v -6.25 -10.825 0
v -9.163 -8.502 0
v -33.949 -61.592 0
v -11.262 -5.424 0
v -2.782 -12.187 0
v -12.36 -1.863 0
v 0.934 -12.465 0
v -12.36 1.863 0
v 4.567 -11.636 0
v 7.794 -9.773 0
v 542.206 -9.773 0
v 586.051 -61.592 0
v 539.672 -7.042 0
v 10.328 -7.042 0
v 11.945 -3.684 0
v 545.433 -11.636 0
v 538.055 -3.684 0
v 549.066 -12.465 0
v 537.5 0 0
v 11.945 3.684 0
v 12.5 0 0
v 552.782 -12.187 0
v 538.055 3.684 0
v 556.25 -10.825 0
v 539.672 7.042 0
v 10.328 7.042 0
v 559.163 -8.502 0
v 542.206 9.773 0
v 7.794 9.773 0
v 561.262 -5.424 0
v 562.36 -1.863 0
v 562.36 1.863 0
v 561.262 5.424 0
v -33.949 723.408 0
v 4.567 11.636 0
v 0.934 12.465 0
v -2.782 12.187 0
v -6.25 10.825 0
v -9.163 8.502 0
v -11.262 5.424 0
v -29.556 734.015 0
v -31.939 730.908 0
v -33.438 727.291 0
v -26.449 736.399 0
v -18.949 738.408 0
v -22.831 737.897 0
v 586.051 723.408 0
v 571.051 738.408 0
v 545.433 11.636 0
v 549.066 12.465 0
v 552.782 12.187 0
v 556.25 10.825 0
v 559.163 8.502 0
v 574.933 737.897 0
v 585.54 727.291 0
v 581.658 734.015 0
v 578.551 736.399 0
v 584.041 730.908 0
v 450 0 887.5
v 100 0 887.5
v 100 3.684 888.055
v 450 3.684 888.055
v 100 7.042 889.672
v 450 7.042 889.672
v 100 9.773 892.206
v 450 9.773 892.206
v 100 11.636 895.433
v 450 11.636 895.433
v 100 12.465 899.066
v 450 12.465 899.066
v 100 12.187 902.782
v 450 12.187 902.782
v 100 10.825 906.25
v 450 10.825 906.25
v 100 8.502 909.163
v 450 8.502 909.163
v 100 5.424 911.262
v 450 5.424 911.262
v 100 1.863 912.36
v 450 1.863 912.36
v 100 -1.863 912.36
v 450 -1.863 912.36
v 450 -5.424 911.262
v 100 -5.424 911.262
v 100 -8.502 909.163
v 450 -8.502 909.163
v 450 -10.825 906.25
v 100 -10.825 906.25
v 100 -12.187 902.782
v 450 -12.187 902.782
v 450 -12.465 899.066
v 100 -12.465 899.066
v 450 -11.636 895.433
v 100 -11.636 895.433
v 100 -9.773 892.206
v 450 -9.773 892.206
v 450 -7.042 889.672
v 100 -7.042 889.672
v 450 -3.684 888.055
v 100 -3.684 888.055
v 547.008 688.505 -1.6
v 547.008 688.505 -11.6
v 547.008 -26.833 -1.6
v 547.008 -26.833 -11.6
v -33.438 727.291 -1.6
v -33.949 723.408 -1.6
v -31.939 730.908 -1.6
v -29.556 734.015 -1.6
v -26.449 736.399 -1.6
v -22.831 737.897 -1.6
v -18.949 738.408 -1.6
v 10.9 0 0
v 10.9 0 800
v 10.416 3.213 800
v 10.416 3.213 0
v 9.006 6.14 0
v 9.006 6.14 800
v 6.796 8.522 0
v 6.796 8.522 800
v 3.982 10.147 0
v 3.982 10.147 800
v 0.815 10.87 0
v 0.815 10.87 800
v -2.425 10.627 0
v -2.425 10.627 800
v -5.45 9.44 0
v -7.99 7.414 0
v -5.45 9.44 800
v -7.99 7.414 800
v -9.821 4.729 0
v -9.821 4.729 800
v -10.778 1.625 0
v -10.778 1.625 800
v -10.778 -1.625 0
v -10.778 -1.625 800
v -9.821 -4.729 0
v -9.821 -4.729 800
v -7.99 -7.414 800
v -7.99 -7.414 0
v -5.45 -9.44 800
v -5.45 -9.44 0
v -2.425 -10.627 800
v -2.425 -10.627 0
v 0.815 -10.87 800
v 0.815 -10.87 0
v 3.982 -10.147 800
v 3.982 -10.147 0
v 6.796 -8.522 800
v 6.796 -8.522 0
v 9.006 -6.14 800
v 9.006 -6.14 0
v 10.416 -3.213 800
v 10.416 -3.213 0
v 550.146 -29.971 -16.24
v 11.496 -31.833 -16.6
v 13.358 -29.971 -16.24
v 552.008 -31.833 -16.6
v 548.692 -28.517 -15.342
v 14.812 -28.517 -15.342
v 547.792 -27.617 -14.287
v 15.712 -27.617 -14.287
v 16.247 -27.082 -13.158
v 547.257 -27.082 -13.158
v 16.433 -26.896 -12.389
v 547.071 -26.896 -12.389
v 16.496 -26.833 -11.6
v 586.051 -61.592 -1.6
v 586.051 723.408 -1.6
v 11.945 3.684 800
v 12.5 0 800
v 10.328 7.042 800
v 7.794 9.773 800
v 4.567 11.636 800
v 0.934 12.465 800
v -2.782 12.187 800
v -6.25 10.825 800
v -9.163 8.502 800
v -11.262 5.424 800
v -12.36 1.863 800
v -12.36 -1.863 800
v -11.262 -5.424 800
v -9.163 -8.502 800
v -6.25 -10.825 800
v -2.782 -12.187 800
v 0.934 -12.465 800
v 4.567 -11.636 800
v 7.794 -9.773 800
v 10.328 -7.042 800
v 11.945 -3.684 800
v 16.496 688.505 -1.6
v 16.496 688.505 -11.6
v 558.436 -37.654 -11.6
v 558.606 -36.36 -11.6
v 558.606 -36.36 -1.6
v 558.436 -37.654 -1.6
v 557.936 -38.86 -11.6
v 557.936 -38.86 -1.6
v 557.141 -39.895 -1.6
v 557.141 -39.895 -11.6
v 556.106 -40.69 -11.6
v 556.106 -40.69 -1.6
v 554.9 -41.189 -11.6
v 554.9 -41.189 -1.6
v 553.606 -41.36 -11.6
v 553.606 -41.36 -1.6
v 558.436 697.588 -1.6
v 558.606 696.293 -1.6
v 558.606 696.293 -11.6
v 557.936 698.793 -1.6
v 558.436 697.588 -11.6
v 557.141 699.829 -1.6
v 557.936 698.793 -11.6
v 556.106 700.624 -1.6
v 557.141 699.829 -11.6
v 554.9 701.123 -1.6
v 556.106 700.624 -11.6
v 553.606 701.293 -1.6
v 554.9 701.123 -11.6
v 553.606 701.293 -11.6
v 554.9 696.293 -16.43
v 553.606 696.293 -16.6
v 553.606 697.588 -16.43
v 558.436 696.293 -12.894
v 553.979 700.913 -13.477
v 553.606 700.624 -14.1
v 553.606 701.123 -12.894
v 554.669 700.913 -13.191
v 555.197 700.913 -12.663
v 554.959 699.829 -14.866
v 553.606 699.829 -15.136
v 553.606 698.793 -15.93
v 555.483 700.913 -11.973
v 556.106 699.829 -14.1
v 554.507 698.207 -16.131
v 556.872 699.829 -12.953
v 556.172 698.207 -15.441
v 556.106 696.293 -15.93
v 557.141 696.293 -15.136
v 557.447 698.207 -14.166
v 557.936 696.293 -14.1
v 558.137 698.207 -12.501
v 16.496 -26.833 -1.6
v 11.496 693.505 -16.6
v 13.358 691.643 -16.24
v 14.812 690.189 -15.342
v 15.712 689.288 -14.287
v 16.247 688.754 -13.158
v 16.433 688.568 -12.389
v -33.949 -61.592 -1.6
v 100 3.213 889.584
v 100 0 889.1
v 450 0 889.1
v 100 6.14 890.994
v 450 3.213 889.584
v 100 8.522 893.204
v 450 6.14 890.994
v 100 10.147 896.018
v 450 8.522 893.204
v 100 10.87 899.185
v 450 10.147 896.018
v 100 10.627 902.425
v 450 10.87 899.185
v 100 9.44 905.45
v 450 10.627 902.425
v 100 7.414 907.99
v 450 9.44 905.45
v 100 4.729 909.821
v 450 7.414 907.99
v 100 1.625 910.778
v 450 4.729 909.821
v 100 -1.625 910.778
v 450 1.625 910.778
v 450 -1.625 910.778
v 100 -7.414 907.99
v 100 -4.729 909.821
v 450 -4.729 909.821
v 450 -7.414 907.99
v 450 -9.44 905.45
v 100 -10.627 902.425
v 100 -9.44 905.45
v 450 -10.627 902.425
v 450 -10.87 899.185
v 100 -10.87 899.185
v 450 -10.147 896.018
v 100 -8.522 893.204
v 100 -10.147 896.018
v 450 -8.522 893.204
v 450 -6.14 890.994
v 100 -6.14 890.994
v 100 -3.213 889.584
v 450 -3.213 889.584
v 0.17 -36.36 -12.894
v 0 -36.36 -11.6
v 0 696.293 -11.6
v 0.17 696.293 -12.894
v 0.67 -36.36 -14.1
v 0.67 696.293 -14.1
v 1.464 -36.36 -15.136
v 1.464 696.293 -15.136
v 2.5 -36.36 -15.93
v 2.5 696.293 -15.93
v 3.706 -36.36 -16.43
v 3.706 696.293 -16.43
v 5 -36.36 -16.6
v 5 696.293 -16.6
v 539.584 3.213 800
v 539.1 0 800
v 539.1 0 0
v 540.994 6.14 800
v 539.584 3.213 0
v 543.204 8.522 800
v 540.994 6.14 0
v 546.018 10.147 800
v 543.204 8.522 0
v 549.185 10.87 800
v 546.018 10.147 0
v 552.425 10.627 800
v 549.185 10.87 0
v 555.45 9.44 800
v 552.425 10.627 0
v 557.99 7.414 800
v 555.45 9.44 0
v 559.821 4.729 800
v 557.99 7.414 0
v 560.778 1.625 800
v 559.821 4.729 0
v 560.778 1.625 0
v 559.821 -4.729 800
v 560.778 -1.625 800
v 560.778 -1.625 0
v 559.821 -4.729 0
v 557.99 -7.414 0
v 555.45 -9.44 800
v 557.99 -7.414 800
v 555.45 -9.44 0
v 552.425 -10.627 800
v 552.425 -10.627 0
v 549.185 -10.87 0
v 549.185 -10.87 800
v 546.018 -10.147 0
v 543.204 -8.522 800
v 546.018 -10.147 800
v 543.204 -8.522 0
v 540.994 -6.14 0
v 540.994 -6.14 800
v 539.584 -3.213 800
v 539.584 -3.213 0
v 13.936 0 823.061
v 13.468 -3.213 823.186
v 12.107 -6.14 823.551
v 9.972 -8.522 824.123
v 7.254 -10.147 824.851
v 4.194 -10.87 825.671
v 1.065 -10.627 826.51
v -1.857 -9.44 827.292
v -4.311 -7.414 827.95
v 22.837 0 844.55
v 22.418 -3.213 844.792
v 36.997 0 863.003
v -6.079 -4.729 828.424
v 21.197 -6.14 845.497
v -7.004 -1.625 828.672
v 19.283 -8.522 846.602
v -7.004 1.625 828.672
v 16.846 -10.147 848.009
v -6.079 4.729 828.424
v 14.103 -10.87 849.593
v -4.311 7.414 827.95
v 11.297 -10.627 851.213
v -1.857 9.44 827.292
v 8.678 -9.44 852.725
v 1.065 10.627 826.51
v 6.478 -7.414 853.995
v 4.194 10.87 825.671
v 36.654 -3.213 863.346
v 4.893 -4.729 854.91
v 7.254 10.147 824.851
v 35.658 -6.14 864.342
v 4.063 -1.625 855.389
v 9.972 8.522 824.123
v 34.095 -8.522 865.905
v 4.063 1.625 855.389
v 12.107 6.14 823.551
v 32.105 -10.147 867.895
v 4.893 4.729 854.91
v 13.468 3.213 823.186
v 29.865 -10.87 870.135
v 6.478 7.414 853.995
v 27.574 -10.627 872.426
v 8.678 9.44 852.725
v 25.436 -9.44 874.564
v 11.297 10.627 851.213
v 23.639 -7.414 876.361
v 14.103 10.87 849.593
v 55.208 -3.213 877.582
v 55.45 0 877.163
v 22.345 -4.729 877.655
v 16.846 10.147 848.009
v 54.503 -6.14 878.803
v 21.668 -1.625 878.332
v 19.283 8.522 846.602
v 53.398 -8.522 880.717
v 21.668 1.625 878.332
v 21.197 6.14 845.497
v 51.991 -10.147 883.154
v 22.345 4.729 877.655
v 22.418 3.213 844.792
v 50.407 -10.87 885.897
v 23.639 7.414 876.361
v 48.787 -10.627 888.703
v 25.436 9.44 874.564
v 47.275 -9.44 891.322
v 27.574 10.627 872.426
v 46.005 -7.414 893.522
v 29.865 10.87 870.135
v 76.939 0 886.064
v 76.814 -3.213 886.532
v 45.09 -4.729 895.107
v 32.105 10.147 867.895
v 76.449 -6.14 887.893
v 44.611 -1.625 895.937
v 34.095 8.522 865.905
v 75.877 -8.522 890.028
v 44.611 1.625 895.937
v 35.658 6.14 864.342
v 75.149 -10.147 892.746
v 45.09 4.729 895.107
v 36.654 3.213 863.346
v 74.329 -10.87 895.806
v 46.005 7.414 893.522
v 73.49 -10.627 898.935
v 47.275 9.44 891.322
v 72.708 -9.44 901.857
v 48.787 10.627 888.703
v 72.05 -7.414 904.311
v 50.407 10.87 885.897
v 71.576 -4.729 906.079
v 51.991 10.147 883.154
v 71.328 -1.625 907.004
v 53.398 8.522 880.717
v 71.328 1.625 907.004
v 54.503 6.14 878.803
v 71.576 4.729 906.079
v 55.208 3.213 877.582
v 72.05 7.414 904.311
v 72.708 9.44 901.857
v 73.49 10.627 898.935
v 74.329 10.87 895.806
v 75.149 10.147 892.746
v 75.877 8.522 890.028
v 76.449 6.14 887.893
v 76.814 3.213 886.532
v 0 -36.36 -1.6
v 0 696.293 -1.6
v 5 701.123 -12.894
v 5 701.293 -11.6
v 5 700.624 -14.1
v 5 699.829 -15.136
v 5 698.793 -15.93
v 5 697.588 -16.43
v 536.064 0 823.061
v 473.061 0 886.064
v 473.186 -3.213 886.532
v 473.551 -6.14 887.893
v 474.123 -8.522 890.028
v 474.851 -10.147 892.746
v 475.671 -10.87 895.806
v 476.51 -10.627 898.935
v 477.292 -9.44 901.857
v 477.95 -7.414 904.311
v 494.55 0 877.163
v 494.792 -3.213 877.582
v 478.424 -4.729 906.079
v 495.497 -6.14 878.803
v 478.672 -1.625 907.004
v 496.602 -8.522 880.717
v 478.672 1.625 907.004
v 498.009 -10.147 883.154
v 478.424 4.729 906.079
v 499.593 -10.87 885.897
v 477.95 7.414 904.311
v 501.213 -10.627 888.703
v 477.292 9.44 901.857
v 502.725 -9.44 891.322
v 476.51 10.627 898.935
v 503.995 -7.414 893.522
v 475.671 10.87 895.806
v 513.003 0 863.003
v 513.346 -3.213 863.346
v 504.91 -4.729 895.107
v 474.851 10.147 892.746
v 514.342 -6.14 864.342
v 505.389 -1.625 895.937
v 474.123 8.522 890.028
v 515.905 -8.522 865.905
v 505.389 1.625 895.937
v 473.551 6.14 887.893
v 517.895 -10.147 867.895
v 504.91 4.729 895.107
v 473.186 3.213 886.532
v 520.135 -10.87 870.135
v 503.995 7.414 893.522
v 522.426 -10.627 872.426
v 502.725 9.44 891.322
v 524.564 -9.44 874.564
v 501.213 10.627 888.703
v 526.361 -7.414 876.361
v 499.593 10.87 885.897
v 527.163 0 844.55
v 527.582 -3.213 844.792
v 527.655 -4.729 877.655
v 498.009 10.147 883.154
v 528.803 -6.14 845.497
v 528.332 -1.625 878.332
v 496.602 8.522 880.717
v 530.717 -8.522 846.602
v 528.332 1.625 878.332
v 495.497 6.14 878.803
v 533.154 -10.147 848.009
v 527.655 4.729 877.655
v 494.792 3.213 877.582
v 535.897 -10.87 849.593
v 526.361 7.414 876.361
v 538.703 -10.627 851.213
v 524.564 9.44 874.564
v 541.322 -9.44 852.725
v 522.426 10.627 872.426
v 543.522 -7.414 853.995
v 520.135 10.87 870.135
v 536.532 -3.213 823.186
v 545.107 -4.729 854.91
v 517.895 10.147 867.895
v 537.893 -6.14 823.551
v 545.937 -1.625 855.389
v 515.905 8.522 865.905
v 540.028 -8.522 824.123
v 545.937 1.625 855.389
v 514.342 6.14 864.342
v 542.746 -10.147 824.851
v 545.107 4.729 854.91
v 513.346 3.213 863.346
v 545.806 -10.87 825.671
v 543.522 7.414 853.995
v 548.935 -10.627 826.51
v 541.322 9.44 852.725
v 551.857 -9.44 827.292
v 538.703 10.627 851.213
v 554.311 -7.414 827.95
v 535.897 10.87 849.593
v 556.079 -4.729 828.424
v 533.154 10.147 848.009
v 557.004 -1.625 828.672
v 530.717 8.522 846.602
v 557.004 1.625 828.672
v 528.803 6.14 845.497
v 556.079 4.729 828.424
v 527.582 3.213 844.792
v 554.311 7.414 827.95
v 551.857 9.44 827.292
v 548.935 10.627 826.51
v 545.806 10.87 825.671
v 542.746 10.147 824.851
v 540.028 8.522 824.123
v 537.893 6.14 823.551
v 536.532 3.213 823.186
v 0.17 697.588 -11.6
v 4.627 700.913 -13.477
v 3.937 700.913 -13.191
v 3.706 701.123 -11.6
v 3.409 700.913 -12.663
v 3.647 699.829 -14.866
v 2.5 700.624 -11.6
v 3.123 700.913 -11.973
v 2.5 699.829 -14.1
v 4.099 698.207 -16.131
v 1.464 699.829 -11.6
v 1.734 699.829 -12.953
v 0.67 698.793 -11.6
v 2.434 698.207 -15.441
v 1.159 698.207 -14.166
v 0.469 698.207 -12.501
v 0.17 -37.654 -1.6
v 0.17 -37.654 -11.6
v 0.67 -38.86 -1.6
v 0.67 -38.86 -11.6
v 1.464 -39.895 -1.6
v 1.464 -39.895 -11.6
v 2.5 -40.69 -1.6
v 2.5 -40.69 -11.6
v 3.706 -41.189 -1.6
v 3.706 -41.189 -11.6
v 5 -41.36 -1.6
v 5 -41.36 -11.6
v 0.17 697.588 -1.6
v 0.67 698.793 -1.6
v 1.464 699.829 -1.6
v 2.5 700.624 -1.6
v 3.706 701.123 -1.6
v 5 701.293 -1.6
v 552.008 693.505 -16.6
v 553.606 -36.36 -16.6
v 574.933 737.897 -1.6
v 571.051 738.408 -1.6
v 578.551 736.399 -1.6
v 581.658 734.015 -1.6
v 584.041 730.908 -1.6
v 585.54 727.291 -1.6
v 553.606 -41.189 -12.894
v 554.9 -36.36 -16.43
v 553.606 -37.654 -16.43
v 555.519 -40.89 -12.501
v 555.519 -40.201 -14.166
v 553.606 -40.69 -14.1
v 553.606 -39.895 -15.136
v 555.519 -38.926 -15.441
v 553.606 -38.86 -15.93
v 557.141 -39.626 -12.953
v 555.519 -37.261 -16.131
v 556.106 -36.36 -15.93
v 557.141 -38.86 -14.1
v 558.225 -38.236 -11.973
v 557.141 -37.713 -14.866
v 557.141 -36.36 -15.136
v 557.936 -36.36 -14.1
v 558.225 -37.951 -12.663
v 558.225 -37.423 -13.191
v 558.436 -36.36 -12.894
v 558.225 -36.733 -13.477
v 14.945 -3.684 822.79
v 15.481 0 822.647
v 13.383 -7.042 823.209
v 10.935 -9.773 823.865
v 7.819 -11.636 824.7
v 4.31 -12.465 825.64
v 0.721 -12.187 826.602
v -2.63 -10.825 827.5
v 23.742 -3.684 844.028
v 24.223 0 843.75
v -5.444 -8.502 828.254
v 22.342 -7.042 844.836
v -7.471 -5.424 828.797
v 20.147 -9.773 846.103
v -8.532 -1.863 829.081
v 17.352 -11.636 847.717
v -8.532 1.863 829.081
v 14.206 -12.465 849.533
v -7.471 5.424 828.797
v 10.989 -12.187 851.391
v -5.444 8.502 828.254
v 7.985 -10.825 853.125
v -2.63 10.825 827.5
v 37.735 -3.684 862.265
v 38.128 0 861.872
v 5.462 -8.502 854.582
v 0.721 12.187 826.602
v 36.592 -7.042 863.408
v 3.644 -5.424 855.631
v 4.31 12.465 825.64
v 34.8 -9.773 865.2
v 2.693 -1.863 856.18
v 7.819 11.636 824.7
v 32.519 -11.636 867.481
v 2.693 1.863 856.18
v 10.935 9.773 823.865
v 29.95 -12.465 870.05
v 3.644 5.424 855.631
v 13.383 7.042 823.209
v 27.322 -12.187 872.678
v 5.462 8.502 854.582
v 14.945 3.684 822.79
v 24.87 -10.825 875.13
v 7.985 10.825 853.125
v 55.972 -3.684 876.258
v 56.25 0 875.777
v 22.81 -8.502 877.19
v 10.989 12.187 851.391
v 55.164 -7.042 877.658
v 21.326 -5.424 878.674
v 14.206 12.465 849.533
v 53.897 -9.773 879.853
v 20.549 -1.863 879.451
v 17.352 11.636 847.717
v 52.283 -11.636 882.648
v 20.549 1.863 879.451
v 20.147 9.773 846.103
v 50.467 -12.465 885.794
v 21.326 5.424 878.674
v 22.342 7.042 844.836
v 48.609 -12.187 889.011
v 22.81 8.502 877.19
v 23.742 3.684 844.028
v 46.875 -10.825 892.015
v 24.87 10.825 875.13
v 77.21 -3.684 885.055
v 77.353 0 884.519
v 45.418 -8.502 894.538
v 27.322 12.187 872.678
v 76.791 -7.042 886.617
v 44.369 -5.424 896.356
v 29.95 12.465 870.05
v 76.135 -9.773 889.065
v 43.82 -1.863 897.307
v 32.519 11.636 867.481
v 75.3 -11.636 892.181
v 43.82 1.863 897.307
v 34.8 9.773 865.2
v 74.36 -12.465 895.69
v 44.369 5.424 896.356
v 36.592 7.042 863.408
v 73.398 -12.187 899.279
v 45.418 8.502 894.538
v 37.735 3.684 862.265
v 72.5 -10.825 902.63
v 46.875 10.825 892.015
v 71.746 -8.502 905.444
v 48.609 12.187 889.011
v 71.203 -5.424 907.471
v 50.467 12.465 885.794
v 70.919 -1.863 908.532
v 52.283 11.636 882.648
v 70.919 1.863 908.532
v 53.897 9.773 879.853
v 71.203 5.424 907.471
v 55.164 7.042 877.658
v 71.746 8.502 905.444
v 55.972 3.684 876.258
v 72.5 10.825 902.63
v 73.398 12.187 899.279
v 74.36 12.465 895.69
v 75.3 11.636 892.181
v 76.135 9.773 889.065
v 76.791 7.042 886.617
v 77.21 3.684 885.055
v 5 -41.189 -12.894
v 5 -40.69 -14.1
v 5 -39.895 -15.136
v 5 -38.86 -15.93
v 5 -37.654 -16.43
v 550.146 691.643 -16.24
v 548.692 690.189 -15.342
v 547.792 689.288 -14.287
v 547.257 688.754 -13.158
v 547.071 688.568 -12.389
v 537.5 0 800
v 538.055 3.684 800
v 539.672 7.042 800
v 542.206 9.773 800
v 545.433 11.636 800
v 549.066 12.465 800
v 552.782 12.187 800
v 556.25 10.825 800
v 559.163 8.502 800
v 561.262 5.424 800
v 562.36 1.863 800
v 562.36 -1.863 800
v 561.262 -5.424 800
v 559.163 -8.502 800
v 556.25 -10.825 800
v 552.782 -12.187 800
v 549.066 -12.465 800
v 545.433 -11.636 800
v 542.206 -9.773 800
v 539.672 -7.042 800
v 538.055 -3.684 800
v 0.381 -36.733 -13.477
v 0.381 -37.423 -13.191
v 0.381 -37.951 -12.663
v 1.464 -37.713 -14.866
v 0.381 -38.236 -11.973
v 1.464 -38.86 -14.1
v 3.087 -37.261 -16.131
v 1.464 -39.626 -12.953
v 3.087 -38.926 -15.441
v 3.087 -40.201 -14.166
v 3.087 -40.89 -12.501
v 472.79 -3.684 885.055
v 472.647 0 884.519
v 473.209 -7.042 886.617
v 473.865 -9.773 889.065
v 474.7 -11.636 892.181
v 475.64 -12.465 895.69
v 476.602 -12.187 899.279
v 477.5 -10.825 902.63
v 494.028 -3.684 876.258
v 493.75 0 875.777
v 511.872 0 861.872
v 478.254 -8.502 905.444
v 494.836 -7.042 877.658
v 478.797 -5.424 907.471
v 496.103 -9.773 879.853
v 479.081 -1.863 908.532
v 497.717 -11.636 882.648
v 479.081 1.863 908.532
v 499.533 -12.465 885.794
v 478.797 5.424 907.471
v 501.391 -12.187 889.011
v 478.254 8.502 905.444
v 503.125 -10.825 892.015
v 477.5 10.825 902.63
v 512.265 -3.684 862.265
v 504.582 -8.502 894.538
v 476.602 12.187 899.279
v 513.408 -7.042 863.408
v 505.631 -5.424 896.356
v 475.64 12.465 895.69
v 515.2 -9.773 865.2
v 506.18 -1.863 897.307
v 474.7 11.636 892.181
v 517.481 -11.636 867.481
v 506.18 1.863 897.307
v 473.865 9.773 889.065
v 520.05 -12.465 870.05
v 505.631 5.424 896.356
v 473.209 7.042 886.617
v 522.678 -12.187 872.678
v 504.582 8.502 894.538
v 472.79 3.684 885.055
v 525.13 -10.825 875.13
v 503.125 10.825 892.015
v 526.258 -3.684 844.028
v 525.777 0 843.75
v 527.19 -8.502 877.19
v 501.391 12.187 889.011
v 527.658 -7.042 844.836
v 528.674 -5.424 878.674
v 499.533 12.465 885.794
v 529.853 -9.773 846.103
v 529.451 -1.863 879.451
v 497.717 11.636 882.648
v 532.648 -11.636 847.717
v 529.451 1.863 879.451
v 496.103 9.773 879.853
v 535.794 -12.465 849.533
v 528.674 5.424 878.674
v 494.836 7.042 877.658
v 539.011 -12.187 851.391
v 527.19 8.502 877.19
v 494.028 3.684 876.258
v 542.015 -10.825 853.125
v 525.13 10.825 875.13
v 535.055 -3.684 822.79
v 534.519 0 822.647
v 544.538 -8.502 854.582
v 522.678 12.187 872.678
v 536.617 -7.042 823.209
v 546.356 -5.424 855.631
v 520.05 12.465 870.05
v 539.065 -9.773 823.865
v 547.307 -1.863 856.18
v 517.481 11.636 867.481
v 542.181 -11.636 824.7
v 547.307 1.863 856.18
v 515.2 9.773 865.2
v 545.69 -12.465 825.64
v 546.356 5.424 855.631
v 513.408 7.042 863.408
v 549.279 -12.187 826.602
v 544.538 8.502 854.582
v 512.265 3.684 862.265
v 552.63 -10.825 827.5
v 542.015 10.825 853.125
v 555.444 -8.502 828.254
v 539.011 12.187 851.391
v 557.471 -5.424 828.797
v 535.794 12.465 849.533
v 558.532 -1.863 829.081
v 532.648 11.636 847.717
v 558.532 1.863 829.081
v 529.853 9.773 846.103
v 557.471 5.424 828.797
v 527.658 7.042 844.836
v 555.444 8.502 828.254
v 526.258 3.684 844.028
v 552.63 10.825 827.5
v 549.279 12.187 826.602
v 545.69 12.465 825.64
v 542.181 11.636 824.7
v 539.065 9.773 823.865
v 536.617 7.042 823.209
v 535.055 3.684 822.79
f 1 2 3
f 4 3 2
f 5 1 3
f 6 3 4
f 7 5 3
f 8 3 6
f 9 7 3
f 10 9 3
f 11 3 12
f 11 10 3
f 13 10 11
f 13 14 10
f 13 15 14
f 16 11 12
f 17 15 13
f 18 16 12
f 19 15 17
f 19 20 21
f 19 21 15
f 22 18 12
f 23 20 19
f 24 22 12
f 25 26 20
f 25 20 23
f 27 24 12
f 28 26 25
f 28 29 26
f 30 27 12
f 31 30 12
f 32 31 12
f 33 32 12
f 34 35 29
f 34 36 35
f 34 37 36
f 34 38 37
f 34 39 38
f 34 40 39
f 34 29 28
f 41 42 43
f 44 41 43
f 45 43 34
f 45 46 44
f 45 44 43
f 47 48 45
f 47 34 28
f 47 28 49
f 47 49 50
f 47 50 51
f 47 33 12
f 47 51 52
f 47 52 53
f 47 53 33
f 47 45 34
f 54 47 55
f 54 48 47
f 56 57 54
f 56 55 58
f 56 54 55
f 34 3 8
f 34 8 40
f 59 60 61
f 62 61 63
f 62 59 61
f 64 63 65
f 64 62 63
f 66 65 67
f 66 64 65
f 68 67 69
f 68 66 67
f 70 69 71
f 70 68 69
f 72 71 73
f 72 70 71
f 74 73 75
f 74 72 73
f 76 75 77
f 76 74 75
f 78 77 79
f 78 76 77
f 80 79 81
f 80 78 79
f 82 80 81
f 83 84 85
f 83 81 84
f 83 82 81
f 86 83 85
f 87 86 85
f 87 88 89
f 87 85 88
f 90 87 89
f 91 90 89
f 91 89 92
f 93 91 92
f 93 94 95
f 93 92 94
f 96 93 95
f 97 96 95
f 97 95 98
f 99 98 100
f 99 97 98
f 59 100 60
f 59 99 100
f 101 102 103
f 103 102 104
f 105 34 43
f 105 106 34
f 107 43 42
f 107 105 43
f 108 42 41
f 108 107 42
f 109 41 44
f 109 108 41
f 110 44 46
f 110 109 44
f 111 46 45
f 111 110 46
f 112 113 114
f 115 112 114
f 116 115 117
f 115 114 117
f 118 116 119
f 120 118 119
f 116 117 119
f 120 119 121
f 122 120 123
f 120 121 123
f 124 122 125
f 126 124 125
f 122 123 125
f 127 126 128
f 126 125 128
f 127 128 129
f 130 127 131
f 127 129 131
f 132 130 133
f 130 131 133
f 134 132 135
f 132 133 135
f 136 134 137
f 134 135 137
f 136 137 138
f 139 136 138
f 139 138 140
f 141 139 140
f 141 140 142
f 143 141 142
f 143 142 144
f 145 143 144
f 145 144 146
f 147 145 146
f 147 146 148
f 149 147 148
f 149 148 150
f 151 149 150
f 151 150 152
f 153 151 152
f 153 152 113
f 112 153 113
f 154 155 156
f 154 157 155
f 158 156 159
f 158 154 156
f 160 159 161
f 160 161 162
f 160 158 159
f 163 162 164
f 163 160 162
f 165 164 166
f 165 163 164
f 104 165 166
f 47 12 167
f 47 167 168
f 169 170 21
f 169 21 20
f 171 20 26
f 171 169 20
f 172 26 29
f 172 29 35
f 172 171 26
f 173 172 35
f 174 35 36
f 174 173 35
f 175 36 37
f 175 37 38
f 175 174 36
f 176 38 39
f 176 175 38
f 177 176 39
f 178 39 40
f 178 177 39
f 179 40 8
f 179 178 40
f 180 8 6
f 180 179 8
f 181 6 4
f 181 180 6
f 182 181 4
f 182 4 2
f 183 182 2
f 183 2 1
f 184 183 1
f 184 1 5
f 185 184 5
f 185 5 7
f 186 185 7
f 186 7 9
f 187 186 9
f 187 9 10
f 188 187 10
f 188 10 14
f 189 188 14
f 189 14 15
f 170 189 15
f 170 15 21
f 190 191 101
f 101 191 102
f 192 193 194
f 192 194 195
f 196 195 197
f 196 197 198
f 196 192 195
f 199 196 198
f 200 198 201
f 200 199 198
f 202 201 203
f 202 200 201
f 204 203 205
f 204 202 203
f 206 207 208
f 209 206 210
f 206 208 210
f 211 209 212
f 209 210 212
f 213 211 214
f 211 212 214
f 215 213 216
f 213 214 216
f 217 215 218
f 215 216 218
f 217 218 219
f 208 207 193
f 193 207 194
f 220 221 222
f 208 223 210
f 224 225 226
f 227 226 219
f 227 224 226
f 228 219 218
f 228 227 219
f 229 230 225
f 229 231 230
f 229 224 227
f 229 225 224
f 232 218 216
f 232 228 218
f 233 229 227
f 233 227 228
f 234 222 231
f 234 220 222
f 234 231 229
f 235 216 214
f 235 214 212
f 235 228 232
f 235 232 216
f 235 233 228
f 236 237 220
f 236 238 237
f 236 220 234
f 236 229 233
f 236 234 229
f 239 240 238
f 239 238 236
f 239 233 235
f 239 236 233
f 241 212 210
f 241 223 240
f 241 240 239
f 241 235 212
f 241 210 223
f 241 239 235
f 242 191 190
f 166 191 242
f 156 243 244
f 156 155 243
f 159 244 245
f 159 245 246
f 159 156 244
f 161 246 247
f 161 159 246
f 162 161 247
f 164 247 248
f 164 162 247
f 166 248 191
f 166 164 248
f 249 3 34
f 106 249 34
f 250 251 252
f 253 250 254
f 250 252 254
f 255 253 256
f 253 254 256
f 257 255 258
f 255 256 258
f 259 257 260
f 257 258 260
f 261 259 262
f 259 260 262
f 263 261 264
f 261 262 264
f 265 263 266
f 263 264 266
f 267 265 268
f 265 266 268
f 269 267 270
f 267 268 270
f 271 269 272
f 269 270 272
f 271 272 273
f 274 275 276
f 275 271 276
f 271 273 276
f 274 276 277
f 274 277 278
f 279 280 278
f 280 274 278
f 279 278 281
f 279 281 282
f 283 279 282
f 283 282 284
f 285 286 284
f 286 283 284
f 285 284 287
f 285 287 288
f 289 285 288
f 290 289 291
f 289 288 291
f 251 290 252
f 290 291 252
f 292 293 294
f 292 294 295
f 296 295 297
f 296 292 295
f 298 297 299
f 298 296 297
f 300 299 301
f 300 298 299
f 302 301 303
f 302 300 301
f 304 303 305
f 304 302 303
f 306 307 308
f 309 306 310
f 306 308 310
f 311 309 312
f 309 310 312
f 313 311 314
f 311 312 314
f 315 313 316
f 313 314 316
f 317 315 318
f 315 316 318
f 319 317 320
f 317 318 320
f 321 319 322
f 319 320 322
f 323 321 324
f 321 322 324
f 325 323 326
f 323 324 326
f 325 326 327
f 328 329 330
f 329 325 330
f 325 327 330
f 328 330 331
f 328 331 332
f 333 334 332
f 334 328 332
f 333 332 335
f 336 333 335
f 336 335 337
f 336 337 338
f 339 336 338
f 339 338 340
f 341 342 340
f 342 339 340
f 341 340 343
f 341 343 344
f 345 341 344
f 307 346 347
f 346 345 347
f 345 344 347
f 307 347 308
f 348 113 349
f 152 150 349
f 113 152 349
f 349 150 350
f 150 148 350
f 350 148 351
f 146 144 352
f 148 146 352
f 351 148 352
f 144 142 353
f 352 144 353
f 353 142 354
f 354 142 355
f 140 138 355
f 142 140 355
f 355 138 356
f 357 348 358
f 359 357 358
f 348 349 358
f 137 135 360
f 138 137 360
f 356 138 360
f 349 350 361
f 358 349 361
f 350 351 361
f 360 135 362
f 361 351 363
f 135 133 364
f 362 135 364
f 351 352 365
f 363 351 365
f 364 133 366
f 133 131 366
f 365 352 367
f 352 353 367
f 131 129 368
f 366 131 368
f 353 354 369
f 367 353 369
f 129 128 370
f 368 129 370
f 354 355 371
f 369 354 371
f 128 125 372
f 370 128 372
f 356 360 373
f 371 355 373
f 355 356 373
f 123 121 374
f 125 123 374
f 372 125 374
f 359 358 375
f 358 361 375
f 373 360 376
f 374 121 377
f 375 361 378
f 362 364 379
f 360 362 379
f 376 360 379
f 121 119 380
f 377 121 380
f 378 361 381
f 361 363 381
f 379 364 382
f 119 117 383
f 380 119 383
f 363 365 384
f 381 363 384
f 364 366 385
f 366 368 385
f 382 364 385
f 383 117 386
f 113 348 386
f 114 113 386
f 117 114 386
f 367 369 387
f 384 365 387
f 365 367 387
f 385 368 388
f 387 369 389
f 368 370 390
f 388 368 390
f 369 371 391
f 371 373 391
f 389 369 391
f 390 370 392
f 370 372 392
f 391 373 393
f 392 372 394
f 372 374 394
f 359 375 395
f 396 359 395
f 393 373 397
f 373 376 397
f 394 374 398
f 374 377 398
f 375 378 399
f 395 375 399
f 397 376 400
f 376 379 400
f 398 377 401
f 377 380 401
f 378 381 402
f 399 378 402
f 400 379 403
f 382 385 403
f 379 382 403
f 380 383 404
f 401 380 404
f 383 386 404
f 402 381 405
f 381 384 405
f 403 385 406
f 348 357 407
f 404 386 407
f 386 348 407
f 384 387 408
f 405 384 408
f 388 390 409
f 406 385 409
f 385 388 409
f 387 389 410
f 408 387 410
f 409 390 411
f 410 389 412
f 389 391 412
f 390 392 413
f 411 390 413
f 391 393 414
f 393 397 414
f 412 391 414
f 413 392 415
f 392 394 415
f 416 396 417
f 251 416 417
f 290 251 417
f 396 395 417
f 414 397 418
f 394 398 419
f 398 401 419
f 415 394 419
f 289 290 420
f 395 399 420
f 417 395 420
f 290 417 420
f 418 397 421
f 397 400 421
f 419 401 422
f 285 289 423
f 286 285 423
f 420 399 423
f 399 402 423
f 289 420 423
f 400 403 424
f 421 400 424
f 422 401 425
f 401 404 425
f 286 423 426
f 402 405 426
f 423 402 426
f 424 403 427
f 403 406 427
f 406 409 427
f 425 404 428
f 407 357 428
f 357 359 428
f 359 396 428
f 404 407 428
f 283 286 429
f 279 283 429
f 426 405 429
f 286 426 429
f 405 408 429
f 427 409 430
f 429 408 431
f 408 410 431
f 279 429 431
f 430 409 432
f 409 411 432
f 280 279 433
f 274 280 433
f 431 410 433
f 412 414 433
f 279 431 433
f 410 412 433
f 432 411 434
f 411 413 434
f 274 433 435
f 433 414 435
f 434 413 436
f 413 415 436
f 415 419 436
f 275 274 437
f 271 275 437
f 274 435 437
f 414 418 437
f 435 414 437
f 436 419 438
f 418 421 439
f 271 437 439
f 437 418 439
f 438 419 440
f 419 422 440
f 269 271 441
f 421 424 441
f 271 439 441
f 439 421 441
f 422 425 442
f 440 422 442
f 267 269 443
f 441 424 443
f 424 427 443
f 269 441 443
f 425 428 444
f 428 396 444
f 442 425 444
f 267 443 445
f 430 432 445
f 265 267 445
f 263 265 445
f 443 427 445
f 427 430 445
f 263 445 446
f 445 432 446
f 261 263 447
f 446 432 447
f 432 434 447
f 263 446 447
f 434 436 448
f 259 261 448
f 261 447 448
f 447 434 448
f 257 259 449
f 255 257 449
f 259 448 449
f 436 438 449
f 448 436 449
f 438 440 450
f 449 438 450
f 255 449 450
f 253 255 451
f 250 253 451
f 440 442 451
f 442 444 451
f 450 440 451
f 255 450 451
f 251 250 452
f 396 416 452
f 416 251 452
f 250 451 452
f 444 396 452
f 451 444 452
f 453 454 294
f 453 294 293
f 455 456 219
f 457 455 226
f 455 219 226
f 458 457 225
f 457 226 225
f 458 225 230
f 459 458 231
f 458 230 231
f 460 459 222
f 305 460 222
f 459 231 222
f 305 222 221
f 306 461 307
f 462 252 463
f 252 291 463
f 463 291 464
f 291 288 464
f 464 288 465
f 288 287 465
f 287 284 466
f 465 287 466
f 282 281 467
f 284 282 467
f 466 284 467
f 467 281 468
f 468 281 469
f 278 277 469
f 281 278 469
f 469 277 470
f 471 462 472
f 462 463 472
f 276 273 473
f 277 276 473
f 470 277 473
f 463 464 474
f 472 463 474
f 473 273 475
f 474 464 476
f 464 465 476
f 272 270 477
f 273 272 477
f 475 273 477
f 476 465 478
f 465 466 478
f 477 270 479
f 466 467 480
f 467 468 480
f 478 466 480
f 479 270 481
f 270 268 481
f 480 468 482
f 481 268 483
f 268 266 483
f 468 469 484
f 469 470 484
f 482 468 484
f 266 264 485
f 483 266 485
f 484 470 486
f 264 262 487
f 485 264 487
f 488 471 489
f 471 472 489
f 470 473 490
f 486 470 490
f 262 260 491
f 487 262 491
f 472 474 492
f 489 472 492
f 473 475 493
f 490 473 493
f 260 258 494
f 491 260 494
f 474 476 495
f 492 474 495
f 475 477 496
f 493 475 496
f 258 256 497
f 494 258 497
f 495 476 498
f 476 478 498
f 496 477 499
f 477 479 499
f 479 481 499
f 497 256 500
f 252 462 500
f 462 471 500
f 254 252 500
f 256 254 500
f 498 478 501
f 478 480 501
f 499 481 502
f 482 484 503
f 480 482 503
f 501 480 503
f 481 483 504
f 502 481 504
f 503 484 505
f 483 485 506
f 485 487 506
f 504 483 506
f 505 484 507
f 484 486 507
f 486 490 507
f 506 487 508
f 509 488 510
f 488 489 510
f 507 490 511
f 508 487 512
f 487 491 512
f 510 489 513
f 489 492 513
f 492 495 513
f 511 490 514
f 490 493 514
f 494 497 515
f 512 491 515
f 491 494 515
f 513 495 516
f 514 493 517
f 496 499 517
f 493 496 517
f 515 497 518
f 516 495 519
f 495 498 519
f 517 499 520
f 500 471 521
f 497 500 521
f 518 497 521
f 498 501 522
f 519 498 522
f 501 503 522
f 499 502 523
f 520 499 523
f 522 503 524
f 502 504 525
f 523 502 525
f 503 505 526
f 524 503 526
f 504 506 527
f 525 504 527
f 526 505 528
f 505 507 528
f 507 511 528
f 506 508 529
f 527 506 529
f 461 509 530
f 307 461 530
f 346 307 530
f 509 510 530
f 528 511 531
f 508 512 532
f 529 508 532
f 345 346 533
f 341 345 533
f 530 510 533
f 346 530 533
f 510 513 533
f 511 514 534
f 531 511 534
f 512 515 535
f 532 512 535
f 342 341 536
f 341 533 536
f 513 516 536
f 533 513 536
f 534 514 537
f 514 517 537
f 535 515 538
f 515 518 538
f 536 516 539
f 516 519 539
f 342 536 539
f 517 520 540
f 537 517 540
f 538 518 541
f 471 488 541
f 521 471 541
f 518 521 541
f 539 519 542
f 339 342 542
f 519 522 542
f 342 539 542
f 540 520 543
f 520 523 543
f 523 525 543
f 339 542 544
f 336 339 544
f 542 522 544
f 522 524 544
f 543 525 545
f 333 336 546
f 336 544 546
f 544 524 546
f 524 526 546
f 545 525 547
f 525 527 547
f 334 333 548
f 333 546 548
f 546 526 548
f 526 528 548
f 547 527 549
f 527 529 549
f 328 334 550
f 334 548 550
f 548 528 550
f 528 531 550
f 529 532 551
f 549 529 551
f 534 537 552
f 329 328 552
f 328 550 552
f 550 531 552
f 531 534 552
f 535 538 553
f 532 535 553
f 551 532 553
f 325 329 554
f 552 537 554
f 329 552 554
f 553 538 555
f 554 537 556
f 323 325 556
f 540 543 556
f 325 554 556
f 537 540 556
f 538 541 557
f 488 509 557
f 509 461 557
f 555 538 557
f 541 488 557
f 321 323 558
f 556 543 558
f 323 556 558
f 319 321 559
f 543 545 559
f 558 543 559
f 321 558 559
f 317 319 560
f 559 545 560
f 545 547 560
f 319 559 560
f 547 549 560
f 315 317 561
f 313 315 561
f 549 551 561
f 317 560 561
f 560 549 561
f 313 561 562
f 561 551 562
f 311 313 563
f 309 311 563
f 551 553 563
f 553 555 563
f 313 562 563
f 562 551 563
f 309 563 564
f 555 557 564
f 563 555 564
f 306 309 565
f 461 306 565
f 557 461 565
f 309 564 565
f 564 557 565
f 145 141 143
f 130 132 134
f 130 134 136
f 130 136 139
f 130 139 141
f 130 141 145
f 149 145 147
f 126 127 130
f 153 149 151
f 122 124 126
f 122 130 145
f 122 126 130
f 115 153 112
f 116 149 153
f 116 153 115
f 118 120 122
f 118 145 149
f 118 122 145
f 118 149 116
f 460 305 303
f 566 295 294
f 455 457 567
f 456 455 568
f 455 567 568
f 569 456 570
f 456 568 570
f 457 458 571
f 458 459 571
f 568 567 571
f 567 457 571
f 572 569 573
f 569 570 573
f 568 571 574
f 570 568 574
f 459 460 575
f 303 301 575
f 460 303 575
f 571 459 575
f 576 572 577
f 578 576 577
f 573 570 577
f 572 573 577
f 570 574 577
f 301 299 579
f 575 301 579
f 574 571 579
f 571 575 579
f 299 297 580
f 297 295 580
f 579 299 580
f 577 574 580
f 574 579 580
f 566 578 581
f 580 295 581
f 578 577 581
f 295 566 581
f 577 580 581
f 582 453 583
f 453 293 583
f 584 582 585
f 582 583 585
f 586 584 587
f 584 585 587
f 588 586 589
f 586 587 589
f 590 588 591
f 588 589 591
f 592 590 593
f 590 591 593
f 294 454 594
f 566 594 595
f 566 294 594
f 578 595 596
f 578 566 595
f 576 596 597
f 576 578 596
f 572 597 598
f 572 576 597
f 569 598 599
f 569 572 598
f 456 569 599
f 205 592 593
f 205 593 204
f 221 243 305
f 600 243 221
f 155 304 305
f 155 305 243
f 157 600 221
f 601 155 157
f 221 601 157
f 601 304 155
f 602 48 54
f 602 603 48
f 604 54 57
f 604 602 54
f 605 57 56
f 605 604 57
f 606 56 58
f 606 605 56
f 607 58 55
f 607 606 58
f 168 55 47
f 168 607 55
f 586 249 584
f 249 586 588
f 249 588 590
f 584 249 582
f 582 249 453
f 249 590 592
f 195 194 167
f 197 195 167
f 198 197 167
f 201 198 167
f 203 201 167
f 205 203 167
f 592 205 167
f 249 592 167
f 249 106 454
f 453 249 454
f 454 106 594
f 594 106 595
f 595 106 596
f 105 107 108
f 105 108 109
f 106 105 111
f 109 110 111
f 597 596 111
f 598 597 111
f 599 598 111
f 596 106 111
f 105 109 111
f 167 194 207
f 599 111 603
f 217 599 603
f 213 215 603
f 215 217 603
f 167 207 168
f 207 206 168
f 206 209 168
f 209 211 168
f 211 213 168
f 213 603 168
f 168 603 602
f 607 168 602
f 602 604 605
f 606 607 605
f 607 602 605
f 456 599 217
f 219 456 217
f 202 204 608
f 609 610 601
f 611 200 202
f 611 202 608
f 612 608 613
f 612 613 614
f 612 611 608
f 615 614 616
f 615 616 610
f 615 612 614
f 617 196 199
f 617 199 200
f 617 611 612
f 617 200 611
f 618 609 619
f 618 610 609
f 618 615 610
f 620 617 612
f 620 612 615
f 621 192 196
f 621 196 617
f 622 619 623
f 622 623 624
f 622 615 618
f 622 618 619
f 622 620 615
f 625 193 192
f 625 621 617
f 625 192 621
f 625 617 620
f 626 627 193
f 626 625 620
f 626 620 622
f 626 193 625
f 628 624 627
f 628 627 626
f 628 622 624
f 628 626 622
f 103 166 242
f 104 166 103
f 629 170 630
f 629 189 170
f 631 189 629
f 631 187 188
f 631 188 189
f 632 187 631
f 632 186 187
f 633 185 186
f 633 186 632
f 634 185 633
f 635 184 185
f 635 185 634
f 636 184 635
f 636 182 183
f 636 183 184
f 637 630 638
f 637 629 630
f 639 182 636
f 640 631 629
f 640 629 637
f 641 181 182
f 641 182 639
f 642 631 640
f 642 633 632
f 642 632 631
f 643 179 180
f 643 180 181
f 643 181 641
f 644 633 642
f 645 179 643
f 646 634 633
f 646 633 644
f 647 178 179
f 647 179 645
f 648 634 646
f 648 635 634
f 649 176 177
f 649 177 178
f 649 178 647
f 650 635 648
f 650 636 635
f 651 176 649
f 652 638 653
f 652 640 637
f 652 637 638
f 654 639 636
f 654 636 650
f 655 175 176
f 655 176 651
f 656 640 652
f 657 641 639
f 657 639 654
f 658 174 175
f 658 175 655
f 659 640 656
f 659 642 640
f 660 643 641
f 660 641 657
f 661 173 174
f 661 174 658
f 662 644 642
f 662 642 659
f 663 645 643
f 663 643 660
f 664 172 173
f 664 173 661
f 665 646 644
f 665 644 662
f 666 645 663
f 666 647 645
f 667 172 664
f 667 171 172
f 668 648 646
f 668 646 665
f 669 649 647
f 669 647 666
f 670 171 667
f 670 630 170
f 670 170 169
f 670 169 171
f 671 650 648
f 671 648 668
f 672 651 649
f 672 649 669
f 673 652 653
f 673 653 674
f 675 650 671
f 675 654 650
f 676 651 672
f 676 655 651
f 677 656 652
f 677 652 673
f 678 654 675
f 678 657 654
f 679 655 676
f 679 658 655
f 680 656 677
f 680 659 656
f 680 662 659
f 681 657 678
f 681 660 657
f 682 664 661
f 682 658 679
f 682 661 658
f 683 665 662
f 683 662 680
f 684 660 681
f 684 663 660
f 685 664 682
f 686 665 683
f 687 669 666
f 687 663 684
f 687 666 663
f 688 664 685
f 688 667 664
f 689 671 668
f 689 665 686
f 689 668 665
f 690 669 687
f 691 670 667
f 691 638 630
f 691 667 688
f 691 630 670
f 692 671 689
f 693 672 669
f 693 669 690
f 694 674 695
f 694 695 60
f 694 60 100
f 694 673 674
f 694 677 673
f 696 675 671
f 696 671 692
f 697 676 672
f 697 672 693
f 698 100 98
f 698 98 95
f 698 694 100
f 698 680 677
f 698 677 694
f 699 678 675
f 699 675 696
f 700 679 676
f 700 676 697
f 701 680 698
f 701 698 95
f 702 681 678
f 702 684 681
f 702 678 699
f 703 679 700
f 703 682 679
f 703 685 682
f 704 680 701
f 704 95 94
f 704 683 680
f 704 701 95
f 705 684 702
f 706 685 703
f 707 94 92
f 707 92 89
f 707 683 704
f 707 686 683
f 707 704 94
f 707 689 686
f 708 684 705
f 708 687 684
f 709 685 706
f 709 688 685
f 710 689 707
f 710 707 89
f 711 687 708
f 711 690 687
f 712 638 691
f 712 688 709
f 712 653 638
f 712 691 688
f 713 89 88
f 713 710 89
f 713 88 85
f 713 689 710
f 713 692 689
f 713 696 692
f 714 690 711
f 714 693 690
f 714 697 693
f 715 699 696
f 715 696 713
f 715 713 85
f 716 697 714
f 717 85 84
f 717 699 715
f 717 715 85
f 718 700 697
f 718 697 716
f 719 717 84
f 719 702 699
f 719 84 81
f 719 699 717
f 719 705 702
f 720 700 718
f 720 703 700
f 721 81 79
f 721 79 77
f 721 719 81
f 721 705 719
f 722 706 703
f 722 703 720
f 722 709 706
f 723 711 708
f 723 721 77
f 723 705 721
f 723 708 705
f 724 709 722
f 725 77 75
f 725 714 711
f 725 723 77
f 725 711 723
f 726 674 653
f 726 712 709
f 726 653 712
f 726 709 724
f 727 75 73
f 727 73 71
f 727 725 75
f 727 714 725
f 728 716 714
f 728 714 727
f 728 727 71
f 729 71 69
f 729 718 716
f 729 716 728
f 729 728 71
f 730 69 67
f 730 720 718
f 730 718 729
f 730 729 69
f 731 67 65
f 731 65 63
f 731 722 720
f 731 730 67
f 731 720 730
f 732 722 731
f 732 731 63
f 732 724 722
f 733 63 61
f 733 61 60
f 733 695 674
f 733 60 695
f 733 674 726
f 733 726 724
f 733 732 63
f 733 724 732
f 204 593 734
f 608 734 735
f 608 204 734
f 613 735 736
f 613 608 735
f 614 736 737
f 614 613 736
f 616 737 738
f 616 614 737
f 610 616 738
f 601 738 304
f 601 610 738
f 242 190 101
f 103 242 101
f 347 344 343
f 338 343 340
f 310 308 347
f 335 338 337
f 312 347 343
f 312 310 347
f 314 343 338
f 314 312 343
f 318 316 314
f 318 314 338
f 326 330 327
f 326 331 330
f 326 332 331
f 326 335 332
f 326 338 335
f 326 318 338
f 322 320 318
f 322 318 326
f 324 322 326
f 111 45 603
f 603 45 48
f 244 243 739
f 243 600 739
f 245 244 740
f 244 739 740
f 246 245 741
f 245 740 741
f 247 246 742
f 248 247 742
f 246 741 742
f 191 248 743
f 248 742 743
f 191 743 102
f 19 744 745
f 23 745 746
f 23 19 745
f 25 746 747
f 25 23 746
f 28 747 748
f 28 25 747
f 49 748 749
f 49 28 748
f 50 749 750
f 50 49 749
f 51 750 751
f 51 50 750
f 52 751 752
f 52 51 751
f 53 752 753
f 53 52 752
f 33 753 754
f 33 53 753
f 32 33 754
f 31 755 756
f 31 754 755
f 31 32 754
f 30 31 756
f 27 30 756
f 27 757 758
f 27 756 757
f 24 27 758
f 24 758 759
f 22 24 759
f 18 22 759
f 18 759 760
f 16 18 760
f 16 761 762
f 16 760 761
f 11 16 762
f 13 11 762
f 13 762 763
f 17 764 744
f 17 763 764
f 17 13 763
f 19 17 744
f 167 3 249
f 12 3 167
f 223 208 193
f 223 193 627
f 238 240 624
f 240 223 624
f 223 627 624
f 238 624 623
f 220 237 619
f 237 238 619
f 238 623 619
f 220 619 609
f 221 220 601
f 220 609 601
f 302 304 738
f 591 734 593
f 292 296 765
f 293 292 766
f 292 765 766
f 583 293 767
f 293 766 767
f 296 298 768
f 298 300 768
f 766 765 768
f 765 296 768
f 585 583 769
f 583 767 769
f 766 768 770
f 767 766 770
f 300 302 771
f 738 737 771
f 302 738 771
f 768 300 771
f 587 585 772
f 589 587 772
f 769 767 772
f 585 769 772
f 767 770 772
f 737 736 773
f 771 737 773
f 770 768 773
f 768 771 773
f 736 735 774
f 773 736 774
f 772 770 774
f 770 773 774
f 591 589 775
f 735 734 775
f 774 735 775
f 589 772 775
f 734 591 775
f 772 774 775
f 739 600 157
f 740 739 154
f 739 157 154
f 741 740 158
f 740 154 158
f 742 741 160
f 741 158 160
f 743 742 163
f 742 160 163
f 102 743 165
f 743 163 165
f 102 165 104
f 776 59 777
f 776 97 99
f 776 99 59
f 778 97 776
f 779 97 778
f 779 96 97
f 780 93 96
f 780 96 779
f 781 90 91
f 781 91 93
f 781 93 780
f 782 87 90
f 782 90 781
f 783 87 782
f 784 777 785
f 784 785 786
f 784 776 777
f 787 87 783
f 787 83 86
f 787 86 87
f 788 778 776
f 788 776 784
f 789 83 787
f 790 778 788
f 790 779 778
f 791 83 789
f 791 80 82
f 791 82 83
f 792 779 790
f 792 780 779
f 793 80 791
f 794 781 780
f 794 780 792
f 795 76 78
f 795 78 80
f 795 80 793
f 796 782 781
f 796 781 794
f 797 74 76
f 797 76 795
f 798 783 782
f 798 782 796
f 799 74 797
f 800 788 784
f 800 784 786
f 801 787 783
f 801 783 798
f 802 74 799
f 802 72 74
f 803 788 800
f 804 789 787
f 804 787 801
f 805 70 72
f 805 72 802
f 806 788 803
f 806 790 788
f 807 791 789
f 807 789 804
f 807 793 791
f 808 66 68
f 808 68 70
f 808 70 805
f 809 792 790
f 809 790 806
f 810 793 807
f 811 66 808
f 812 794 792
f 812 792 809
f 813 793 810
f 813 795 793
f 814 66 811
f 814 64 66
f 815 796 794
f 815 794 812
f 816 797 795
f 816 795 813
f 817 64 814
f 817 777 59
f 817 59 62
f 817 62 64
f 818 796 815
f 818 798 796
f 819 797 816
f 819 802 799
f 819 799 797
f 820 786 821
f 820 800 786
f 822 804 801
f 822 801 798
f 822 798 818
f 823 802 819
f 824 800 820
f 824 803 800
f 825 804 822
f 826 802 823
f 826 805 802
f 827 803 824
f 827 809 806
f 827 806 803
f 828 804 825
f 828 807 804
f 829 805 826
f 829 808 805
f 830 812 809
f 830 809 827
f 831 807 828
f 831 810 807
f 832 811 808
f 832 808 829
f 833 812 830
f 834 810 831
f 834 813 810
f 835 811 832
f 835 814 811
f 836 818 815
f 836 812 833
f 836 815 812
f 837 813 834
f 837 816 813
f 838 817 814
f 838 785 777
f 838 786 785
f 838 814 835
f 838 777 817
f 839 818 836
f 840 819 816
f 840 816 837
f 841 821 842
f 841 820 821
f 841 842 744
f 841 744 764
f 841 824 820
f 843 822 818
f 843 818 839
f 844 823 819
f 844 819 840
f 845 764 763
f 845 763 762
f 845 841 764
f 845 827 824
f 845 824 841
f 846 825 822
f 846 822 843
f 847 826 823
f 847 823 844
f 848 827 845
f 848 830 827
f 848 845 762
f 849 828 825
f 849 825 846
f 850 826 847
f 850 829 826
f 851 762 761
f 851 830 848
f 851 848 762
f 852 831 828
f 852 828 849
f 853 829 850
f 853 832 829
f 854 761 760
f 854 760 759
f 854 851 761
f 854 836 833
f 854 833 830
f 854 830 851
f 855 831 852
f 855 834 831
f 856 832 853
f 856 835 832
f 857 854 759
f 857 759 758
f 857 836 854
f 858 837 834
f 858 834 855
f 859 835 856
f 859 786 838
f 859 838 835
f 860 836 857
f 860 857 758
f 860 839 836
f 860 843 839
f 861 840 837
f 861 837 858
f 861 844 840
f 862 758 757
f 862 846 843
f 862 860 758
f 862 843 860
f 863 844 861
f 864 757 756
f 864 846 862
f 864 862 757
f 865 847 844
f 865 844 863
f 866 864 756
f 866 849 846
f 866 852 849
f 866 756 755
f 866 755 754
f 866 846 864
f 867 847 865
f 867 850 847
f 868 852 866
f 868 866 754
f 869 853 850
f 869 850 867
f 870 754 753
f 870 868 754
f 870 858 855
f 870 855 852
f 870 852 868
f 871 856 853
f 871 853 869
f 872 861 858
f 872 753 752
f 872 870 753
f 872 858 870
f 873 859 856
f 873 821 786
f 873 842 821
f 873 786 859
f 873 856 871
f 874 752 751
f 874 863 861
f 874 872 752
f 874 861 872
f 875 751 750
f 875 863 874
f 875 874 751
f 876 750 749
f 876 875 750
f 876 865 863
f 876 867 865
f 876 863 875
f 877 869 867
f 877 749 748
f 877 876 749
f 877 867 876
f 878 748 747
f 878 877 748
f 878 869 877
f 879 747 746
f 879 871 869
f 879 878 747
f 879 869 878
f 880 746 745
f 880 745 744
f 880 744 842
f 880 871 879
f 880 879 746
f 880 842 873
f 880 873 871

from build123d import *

# Parameters (mm, degrees)
F0_R         = 12.5
F0_R_2       = 10.9
F3_W         = 620
F3_H         = 800
F4_DEPTH     = 1.6
F5_R         = 15
F6_R         = 15
F7_W         = 558.6059093475
F7_H         = 742.6531389356
F8_DEPTH     = 15
F9_W         = 530.512617901
F9_H         = 715.3386492282
F10_DEPTH    = 15
F11_R        = 5
F12_T1_DEPTH = 10
F12_S5_W     = 5.1
F12_S5_H     = 5.1
F12_T6_DEPTH = 5.1


# Not quite as in the source:
# - a fillet or chamfer that OpenCascade refuses, or shapes differently, is made with other operations: its cross-section is extruded or revolved along the edge and cut away or added


with BuildPart() as f2:
    # F2: sweep along a path in F1
    with BuildLine(Plane.XZ) as f2_path:
        Line((0, 0), (0, 800))
        ThreePointArc((0, 800), (29.2893218813, 870.7106781187), (100, 900))
        Line((100, 900), (450, 900))
        ThreePointArc((450, 900), (520.7106781187, 870.7106781187), (550, 800))
        Line((550, 800), (550, 0))
    # F0 (on Top) → F2 (sweep)
    with BuildSketch(Plane.XY):
        Circle(F0_R)
        Circle(F0_R_2, mode=Mode.SUBTRACT)
    sweep(path=f2_path.line)

    # F3 (on Top) → F4 (join)
    with BuildSketch(Plane.XY):
        with Locations((276.0508990288, 338.4082295001)):
            Rectangle(F3_W, F3_H)
    extrude(amount=-F4_DEPTH)

    # F5
    f5_edges = [f2.edges().sort_by_distance(p)[0] for p in [
        (-33.949101, 738.40823, -0.8),
    ]]
    fillet(f5_edges, radius=F5_R)

    # F6
    f6_edges = [f2.edges().sort_by_distance(p)[0] for p in [
        (586.050899, 738.40823, -0.8),
    ]]
    fillet(f6_edges, radius=F6_R)

    # F7 (on face) → F8 (join)
    with BuildSketch(Plane(origin=(0, 0, -1.6), x_dir=(1, 0, 0), z_dir=(0, 0, -1))):
        with Locations((279.3029546738, -329.9668394029)):
            Rectangle(F7_W, F7_H)
    extrude(amount=F8_DEPTH)

    # F9 (on face) → F10 (cut)
    with BuildSketch(Plane(origin=(0, 0, -16.6), x_dir=(1, 0, 0), z_dir=(0, 0, -1))):
        with Locations((281.7520266399, -330.8358481154)):
            Rectangle(F9_W, F9_H)
    extrude(amount=-F10_DEPTH, mode=Mode.SUBTRACT)

    # F11
    f11_edges = [f2.edges().sort_by_distance(p)[0] for p in [
        (558.605909, 329.966839, -16.6),
        (547.008336, 330.835848, -16.6),
        (279.302955, -41.35973, -16.6),
        (281.752027, -26.833476, -16.6),
        (16.495718, 330.835848, -16.6),
        (0, 329.966839, -16.6),
        (281.752027, 688.505173, -16.6),
        (279.302955, 701.293409, -16.6),
        (558.605909, 701.293409, -9.1),
        (0, 701.293409, -9.1),
        (0, -41.35973, -9.1),
    ]]
    fillet(f11_edges, radius=F11_R)

    # F12: fillet of radius 5 on 2 edges, made by hand

    # F12_s2 → F12_t1 (cut)
    with BuildSketch(Plane.XY.offset(-11.6)):
        with BuildLine():
            ThreePointArc((558.6059093475, -36.3597300649), (557.1414432535, -39.8952639708), (553.6059093475, -41.3597300649))
            Line((553.6059093475, -41.3597300649), (558.6059093475, -41.3597300649))
            Line((558.6059093475, -41.3597300649), (558.6059093475, -36.3597300649))
        make_face()
    extrude(amount=F12_T1_DEPTH, mode=Mode.SUBTRACT)


with BuildPart() as f12_tool4:
    # F12_s5 → F12_t6 (new body)
    with BuildSketch(Plane.YZ.offset(553.6059093475)):
        with Locations((-38.9097300649, -14.15)):
            Rectangle(F12_S5_W, F12_S5_H)
    extrude(amount=F12_T6_DEPTH)

    # F12_s7 → F12_t8 (revolve, cut)
    with BuildSketch(Plane(origin=(553.6059093475, -36.3597300649, -11.6), x_dir=(0, 0.7071067812, 0.7071067812), z_dir=(0, 0.7071067812, -0.7071067812))):
        with BuildLine():
            ThreePointArc((0, -5), (5, 0), (0, 5))
            Line((0, 5), (0, -5))
        make_face()
    revolve(axis=Axis((553.6059093475, -36.3597300649, -11.6), (1, 0, 0)), mode=Mode.SUBTRACT)


with BuildPart() as f2_1:
    add(f2.part)

    # F12_t3: cut F12_tool4
    add(f12_tool4.part, mode=Mode.SUBTRACT)


solid = f2_1.part
